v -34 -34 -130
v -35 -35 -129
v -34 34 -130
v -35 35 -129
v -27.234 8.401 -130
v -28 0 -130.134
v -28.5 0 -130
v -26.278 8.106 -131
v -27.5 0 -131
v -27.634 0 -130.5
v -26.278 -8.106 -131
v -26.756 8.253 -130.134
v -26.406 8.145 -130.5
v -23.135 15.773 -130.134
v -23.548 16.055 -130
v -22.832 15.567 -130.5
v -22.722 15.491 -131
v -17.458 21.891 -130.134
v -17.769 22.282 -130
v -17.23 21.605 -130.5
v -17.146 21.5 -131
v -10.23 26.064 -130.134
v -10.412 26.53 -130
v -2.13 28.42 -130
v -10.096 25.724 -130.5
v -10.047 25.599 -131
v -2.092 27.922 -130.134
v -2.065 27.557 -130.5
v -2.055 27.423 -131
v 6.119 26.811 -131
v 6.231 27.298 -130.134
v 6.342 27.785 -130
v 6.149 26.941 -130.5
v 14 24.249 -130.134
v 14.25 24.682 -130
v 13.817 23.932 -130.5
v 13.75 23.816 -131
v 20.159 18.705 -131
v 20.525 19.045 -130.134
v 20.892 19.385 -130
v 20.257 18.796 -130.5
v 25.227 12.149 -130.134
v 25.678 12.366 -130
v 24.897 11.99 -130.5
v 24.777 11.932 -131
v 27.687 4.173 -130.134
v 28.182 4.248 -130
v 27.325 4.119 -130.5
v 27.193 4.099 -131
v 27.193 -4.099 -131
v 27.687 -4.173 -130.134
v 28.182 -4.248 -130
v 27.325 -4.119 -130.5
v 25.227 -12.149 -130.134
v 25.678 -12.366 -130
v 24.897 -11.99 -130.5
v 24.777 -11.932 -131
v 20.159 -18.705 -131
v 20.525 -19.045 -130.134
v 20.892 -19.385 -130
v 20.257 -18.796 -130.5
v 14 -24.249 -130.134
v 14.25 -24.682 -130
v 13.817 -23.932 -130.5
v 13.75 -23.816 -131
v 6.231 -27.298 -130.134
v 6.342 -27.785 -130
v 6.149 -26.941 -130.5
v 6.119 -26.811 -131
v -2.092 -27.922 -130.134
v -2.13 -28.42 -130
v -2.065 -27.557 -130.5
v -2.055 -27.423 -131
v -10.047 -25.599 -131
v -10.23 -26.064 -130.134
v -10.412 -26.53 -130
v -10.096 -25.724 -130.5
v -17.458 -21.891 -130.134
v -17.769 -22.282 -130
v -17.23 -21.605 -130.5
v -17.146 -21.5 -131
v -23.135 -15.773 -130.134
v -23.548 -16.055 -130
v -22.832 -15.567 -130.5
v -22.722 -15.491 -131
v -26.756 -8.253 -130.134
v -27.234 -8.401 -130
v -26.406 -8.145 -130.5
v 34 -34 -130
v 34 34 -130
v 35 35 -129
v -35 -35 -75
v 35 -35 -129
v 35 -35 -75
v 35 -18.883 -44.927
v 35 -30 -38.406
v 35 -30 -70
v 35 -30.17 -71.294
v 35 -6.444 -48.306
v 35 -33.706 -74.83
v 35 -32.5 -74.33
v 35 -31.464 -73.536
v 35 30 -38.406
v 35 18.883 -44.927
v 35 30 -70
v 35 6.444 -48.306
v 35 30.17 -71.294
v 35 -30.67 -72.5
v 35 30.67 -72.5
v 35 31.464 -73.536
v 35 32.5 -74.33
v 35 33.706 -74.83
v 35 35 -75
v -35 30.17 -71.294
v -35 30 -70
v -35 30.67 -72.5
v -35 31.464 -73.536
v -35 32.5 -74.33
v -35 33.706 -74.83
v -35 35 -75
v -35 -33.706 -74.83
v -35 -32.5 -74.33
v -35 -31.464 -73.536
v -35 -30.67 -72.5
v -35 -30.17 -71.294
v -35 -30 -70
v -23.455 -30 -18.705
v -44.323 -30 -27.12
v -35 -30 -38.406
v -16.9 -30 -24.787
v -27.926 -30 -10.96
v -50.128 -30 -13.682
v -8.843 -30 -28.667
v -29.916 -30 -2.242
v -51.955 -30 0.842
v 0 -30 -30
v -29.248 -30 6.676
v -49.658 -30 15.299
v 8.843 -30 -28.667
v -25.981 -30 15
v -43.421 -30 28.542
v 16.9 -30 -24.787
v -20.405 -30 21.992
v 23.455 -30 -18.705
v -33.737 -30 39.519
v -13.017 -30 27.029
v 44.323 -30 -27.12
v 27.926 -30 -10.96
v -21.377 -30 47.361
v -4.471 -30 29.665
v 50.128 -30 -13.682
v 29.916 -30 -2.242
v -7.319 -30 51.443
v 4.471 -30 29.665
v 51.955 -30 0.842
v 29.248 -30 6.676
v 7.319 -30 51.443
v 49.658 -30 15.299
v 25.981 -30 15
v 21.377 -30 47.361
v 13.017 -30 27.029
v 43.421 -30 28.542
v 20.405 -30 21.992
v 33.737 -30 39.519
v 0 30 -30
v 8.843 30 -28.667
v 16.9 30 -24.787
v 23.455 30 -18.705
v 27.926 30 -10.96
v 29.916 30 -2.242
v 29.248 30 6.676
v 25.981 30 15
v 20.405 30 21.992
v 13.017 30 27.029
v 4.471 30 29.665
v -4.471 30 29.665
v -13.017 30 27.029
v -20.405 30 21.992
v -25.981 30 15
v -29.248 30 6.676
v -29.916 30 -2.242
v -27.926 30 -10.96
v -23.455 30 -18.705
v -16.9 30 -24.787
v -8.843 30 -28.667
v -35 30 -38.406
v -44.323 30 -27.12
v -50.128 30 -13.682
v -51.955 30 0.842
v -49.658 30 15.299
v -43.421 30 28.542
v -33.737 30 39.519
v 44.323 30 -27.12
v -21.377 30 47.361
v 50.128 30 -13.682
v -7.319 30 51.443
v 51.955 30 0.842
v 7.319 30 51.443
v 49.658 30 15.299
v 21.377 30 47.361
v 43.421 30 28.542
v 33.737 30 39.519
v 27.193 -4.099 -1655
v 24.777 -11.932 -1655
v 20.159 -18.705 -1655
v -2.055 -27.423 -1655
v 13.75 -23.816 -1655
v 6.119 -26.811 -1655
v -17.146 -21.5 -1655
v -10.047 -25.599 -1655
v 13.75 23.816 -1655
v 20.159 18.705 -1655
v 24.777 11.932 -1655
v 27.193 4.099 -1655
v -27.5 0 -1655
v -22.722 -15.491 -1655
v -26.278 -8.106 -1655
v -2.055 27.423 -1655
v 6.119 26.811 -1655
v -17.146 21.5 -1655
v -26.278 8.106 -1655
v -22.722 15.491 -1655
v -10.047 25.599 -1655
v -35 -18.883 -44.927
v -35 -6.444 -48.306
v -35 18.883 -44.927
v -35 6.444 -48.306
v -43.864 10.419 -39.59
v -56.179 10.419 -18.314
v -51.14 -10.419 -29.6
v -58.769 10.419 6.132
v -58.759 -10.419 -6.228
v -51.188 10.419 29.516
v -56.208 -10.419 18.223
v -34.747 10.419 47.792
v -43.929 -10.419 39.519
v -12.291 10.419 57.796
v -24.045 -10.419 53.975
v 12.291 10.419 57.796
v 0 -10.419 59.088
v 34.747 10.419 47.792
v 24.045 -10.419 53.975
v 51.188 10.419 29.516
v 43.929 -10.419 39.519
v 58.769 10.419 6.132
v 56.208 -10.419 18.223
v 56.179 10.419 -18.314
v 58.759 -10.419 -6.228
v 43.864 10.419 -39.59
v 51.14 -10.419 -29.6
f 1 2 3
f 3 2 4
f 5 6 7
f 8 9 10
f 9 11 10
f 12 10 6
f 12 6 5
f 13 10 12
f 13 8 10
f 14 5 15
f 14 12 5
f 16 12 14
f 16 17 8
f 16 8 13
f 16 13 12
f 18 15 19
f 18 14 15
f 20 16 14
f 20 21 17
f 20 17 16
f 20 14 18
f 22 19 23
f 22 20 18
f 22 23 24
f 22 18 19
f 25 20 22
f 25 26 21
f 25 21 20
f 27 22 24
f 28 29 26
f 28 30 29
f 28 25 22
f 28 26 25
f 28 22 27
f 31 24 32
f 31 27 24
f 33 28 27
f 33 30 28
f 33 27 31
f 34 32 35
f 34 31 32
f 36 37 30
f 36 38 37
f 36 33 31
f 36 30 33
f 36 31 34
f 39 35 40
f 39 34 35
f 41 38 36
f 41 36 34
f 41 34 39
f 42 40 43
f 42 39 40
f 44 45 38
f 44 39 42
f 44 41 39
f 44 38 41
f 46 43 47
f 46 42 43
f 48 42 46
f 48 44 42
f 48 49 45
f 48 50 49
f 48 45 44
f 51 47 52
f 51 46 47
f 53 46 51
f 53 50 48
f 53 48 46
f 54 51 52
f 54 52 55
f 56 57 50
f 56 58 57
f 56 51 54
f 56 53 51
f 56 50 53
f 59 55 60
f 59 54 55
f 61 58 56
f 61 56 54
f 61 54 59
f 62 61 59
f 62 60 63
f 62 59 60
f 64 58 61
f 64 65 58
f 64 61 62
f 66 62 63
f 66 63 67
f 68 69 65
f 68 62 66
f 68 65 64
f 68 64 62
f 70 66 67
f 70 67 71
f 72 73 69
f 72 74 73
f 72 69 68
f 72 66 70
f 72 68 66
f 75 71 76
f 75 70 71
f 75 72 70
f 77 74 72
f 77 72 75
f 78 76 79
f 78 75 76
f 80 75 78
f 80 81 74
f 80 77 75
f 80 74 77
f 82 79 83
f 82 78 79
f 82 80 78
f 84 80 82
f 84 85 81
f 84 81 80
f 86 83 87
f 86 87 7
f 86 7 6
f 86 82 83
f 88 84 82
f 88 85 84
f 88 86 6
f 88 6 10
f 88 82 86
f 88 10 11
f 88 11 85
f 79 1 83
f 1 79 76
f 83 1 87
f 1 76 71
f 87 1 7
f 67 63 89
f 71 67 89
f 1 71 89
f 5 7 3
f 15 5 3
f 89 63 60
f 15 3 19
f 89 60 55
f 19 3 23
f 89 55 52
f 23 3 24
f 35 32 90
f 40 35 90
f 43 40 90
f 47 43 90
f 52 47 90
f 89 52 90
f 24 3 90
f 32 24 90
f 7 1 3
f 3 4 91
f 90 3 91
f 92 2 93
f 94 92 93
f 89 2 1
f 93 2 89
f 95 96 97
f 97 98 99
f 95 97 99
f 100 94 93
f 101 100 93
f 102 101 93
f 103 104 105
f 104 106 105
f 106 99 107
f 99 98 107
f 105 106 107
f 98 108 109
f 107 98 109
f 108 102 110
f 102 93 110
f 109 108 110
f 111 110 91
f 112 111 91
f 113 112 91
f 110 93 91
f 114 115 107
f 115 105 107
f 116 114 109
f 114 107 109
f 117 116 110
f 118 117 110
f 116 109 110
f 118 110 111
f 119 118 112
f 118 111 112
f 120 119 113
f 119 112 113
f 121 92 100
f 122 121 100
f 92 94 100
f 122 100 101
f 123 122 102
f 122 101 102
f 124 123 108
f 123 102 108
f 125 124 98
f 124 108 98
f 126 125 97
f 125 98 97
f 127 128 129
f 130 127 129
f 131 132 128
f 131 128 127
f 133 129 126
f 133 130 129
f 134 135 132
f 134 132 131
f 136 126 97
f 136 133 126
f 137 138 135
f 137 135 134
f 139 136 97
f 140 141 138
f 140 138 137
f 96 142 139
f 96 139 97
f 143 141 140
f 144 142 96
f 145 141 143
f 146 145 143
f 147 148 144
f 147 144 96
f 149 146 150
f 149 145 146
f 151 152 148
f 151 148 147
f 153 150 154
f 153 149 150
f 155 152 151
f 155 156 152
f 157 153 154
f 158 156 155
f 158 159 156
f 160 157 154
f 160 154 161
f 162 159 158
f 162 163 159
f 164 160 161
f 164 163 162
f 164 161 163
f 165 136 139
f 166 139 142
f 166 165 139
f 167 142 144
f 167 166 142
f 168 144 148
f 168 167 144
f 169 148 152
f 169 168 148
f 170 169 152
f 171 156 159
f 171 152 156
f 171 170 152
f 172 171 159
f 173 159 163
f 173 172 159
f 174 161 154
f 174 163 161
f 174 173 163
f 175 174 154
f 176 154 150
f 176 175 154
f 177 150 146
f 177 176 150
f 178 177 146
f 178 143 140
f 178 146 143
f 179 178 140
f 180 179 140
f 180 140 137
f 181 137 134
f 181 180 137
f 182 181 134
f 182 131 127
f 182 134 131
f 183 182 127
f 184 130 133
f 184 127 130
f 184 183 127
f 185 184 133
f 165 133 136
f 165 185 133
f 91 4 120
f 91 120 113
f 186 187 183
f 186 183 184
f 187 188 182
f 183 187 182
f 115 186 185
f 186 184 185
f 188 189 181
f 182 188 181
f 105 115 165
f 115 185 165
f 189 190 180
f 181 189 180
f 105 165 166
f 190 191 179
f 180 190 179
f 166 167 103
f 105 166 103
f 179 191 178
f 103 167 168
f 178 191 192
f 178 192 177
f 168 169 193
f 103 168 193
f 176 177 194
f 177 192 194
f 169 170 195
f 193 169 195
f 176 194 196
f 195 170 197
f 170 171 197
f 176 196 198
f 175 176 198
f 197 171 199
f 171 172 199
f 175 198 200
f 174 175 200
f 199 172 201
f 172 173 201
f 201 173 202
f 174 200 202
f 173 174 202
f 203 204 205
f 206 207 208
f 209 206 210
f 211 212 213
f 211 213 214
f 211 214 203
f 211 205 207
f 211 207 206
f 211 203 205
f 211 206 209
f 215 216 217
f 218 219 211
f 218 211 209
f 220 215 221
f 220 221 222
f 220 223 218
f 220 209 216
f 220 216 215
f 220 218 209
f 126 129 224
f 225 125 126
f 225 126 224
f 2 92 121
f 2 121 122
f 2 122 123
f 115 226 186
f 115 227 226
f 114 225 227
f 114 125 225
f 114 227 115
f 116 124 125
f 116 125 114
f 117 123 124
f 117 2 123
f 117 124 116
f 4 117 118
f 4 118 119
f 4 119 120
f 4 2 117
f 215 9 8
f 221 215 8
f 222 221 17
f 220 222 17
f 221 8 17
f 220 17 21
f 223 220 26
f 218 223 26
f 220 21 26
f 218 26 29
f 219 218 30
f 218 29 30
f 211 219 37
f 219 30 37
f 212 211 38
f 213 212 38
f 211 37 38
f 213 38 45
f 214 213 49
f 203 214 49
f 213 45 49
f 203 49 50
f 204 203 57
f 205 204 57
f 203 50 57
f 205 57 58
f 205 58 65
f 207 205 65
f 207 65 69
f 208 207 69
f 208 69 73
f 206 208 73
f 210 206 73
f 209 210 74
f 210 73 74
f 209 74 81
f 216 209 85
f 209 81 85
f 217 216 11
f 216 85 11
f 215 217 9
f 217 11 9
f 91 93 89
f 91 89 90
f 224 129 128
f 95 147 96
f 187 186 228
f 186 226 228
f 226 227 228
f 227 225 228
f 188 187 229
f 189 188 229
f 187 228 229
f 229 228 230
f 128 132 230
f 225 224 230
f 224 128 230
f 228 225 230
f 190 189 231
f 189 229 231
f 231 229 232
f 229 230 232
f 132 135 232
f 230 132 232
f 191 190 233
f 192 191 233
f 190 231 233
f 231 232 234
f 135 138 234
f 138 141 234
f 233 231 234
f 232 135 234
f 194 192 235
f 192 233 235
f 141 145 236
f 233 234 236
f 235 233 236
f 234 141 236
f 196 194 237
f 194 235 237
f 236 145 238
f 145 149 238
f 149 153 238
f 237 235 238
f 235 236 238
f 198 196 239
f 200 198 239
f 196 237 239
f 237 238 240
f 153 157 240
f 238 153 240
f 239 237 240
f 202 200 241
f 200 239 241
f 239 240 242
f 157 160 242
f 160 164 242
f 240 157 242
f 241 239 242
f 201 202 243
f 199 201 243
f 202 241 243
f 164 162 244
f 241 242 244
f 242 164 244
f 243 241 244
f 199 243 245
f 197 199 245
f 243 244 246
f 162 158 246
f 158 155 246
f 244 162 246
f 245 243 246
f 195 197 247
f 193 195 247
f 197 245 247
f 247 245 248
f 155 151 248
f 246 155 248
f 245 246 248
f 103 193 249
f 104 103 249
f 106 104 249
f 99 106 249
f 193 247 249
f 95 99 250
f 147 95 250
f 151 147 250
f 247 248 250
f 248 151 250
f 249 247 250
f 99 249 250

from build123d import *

# Parameters (mm, degrees)
SKETCH_5_W          = 70
SKETCH_5_H          = 70
EXTRUDE_2_DEPTH     = 130
SKETCH_11_R         = 27.5
EXTRUDE_4_DEPTH     = 1525
SKETCH_12_W         = 103.923048454
SKETCH_12_H         = 8.094806624
SKETCH_12_H_2       = 10.367731853
CUT_EXTRUDE_1_DEPTH = 75
CUT_EXTRUDE_START   = -75
SKETCH_13_R         = 30
CUT_EXTRUDE_2_DEPTH = 75
FILLET_3_R          = 5
FILLET_2_R          = 1
CHAMFER_2_SIZE      = 1


with BuildPart() as part:
    # 草图3 → 旋转1 (revolve)
    with BuildSketch(Plane.XY):
        with BuildLine():
            Line((-30, -30), (-30, 30))
            Line((-30, 30), (-51.961524227, 30))
            ThreePointArc((-51.961524227, 30), (-60, 0), (-51.961524227, -30))
            Line((-51.961524227, -30), (-30, -30))
        make_face()
    revolve(axis=Axis((0, 0, 0), (0, 1, 0)))

    # 草图5 → 凸台-拉伸2 (add)
    with BuildSketch(Plane.XY.offset(-130)):
        Rectangle(SKETCH_5_W, SKETCH_5_H)
    extrude(amount=EXTRUDE_2_DEPTH)

    # 草图11 → 凸台-拉伸4 (add)
    with BuildSketch(Plane(origin=(0, 0, -130), x_dir=(-1, 0, 0), z_dir=(0, 0, -1))):
        Circle(SKETCH_11_R)
    extrude(amount=EXTRUDE_4_DEPTH)

    # 草图12 → 切除-拉伸1 (cut)
    with BuildSketch(Plane.XY):
        with Locations((0, 34.047403312)):
            Rectangle(SKETCH_12_W, SKETCH_12_H)
        with Locations((0, -35.183865927)):
            Rectangle(SKETCH_12_W, SKETCH_12_H_2)
    extrude(amount=-CUT_EXTRUDE_1_DEPTH, mode=Mode.SUBTRACT)

    # 草图13 → 切除-拉伸2 (cut)
    with BuildSketch(Plane.XZ.offset(30).offset(CUT_EXTRUDE_START)):
        with Locations(Location((0, 0, 0), (0, 0, 270))):
            Circle(SKETCH_13_R)
    extrude(amount=CUT_EXTRUDE_2_DEPTH, mode=Mode.SUBTRACT)

    # 圆角3
    fillet_3_edges = [part.edges().sort_by_distance(p)[0] for p in [
        (0, -30, -75),
        (0, 30, -75),
    ]]
    fillet(fillet_3_edges, radius=FILLET_3_R - 0.0001)  # a hair under: the kernel refuses the full size

    # 圆角2
    fillet_2_edges = [part.edges().sort_by_distance(p)[0] for p in [
        (27.5, 0, -130),
    ]]
    fillet(fillet_2_edges, radius=FILLET_2_R)

    # 倒角2
    chamfer_2_edges = [part.edges().sort_by_distance(p)[0] for p in [
        (35, 0, -130),
        (-35, 0, -130),
        (0, 35, -130),
        (0, -35, -130),
    ]]
    chamfer(chamfer_2_edges, length=CHAMFER_2_SIZE)


solid = part.part
